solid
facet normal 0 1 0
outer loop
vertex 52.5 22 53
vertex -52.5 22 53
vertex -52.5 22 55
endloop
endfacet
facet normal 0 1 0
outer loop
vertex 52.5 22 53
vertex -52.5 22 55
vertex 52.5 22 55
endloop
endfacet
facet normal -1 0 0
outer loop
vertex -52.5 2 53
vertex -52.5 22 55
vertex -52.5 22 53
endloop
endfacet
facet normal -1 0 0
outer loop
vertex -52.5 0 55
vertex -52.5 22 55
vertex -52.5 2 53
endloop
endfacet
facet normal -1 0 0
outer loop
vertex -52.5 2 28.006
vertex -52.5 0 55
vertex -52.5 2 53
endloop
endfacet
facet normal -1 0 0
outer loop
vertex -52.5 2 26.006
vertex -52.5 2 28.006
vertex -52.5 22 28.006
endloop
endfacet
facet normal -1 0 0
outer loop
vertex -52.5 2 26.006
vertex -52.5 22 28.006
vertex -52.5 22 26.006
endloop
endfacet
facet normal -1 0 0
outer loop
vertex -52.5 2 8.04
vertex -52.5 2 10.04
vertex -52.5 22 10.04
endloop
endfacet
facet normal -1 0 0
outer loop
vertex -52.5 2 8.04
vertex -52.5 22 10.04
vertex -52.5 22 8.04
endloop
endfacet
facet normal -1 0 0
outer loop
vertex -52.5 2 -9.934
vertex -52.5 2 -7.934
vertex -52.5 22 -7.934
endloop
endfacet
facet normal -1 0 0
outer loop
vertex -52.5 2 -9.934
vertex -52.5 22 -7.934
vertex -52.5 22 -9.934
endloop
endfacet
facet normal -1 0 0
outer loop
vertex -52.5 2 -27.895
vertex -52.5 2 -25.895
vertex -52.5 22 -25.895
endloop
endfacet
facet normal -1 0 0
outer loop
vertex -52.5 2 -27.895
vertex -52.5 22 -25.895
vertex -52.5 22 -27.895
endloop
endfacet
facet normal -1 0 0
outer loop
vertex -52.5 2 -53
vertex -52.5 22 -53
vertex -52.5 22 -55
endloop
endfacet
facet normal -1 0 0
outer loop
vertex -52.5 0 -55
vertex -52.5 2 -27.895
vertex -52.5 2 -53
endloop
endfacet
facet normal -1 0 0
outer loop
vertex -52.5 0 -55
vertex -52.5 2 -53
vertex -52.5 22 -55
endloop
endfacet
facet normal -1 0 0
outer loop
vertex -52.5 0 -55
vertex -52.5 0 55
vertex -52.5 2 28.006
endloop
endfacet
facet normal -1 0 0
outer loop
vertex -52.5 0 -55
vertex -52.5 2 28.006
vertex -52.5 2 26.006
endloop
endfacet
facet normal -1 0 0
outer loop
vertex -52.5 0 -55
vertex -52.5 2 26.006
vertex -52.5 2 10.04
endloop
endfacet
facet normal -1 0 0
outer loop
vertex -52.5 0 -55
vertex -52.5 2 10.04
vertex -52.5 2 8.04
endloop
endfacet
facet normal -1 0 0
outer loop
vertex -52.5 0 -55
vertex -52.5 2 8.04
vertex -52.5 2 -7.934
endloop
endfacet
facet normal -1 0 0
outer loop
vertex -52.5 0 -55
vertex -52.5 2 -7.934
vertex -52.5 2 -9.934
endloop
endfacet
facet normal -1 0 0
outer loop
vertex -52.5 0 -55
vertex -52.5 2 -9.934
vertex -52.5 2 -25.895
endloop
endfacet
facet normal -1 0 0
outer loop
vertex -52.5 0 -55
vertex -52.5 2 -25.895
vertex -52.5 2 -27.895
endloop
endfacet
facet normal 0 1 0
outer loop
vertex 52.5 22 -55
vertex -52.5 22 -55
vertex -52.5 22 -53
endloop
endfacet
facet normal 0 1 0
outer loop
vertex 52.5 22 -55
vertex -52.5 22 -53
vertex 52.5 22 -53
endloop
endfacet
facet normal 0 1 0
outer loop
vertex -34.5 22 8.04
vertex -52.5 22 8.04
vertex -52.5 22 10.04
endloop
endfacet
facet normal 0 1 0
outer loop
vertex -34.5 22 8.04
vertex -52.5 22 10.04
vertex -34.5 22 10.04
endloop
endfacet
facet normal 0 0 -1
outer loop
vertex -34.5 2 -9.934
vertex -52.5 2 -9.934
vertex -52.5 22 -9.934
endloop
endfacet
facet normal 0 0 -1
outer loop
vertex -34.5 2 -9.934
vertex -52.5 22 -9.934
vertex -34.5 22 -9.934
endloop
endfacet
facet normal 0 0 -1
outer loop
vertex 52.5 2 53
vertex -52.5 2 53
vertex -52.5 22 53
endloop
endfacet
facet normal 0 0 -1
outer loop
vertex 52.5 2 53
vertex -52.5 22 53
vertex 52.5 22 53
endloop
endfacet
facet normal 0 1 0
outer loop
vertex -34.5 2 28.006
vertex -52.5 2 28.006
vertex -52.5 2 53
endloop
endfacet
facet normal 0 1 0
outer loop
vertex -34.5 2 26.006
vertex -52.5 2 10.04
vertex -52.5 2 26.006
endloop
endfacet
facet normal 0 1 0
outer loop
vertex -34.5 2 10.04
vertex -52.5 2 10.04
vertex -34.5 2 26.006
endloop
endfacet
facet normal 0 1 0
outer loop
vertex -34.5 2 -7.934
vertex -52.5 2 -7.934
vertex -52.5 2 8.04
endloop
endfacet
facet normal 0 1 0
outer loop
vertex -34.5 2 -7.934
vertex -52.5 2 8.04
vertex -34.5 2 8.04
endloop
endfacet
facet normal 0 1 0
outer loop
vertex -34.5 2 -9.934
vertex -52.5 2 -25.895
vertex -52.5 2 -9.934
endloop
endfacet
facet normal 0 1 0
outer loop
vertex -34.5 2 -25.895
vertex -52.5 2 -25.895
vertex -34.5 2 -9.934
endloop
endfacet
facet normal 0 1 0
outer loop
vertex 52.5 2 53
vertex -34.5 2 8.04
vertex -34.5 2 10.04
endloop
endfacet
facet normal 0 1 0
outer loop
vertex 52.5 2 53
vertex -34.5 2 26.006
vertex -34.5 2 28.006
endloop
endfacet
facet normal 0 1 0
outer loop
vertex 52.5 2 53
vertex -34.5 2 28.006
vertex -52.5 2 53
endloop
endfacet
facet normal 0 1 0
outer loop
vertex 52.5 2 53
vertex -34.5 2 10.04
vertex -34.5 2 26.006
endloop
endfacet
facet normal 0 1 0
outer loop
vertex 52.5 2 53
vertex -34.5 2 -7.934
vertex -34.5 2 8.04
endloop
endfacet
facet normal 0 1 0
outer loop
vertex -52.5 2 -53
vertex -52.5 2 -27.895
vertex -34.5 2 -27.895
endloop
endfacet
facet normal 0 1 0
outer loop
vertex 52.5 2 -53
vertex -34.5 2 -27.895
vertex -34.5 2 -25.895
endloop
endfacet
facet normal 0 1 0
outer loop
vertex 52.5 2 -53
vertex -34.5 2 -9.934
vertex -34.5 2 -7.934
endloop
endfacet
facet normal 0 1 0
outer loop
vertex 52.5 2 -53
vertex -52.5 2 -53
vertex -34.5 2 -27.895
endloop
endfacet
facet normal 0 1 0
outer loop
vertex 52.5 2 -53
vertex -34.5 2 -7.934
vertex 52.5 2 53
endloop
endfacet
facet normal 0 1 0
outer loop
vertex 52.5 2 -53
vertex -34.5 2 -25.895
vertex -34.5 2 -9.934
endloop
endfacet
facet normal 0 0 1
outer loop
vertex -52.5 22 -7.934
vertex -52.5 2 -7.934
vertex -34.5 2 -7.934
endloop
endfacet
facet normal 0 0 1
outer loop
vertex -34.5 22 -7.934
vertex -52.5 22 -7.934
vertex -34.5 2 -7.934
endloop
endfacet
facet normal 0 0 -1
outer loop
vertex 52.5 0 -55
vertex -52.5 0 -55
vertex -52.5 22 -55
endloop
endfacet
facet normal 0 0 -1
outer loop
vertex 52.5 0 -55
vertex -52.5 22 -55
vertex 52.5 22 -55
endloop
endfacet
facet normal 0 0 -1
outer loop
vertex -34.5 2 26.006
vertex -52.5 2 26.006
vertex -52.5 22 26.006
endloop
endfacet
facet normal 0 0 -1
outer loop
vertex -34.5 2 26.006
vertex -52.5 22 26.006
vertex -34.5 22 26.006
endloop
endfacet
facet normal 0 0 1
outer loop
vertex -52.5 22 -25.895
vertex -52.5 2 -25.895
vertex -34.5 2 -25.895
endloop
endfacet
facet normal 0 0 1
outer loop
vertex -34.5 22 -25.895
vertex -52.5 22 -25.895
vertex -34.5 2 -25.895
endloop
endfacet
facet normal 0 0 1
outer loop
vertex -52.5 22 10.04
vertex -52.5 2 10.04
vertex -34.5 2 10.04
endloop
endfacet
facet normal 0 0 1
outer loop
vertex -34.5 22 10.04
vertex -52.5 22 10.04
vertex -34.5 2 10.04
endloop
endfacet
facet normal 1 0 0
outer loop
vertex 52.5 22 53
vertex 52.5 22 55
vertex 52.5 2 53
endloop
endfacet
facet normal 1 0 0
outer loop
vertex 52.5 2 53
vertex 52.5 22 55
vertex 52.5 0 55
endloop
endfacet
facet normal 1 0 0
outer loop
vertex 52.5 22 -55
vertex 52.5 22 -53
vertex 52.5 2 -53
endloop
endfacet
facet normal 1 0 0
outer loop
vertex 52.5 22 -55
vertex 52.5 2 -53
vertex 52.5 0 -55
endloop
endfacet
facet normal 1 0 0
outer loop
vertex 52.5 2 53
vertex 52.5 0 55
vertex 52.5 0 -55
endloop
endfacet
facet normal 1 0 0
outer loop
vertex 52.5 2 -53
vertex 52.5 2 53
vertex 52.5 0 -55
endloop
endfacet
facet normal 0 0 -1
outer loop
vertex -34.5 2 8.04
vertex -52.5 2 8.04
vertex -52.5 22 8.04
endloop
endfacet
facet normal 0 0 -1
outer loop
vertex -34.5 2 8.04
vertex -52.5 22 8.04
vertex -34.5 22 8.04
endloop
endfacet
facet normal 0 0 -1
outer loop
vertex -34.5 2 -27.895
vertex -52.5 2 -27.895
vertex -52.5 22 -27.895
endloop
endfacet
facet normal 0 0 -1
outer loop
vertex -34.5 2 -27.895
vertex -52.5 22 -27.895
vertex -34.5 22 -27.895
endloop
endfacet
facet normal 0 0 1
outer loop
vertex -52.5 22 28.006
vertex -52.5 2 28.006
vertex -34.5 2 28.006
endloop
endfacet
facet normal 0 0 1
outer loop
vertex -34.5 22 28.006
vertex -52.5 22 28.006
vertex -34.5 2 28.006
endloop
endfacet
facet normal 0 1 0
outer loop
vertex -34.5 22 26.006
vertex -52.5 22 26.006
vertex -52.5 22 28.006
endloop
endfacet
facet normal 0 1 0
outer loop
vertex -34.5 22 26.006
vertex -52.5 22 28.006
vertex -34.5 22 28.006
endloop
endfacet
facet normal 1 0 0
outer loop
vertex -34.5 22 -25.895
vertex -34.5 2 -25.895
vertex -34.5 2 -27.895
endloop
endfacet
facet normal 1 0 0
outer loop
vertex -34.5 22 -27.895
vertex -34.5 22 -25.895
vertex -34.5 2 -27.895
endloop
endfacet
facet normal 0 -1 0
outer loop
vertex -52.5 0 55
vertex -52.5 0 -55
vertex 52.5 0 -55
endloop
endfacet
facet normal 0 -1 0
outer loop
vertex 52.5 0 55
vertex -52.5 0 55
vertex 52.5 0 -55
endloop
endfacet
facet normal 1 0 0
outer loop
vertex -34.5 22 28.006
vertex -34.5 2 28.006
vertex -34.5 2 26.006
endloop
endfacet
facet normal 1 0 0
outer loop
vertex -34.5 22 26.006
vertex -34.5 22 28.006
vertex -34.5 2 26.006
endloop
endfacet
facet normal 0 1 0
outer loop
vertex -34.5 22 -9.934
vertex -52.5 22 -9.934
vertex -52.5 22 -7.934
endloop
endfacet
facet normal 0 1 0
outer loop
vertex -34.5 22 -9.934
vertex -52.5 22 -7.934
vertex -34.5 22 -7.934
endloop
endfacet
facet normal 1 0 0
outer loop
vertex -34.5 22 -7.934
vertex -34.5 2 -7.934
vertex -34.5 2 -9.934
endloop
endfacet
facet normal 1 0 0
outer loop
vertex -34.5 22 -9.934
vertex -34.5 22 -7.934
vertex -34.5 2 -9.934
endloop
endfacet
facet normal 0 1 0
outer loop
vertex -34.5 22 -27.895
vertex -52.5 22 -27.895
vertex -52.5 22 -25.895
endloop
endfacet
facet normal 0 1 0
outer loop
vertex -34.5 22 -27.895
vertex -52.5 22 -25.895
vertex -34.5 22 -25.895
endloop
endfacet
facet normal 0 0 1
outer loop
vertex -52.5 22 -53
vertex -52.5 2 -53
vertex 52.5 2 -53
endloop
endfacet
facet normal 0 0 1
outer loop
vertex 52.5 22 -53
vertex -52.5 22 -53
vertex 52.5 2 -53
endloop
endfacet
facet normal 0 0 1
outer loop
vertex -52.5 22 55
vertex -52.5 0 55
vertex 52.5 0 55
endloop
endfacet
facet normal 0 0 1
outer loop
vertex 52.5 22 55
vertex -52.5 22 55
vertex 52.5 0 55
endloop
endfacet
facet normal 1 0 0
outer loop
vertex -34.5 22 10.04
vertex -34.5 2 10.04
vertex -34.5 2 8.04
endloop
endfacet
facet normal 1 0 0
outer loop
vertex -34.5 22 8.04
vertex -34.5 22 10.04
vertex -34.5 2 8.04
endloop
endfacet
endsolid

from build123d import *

# Parameters (mm, degrees)
SKETCH2_W           = 105
SKETCH2_H           = 110
BOSS_EXTRUDE1_DEPTH = 2
SKETCH4_W           = 18
SKETCH4_H           = 2
SKETCH4_W_2         = 105
BOSS_EXTRUDE2_DEPTH = 20


with BuildPart() as part:
    # Sketch2 → Boss-Extrude1 (new body)
    with BuildSketch(Plane(origin=(0, 0, 0), x_dir=(1, 0, 0), z_dir=(0, 1, 0))):
        Rectangle(SKETCH2_W, SKETCH2_H)
    extrude(amount=BOSS_EXTRUDE1_DEPTH)

    # Sketch4 → Boss-Extrude2 (add)
    with BuildSketch(Plane(origin=(0, 2, 0), x_dir=(1, 0, 0), z_dir=(0, 1, 0))):
        with Locations((-43.5, 26.895070822)):
            Rectangle(SKETCH4_W, SKETCH4_H)
        with Locations((-43.5, 8.934071448)):
            Rectangle(SKETCH4_W, SKETCH4_H)
        with Locations((-43.5, -9.04022418)):
            Rectangle(SKETCH4_W, SKETCH4_H)
        with Locations((-43.5, -27.006397159)):
            Rectangle(SKETCH4_W, SKETCH4_H)
        with Locations((0, 54)):
            Rectangle(SKETCH4_W_2, SKETCH4_H)
        with Locations((0, -54)):
            Rectangle(SKETCH4_W_2, SKETCH4_H)
    extrude(amount=BOSS_EXTRUDE2_DEPTH)


solid = part.part
